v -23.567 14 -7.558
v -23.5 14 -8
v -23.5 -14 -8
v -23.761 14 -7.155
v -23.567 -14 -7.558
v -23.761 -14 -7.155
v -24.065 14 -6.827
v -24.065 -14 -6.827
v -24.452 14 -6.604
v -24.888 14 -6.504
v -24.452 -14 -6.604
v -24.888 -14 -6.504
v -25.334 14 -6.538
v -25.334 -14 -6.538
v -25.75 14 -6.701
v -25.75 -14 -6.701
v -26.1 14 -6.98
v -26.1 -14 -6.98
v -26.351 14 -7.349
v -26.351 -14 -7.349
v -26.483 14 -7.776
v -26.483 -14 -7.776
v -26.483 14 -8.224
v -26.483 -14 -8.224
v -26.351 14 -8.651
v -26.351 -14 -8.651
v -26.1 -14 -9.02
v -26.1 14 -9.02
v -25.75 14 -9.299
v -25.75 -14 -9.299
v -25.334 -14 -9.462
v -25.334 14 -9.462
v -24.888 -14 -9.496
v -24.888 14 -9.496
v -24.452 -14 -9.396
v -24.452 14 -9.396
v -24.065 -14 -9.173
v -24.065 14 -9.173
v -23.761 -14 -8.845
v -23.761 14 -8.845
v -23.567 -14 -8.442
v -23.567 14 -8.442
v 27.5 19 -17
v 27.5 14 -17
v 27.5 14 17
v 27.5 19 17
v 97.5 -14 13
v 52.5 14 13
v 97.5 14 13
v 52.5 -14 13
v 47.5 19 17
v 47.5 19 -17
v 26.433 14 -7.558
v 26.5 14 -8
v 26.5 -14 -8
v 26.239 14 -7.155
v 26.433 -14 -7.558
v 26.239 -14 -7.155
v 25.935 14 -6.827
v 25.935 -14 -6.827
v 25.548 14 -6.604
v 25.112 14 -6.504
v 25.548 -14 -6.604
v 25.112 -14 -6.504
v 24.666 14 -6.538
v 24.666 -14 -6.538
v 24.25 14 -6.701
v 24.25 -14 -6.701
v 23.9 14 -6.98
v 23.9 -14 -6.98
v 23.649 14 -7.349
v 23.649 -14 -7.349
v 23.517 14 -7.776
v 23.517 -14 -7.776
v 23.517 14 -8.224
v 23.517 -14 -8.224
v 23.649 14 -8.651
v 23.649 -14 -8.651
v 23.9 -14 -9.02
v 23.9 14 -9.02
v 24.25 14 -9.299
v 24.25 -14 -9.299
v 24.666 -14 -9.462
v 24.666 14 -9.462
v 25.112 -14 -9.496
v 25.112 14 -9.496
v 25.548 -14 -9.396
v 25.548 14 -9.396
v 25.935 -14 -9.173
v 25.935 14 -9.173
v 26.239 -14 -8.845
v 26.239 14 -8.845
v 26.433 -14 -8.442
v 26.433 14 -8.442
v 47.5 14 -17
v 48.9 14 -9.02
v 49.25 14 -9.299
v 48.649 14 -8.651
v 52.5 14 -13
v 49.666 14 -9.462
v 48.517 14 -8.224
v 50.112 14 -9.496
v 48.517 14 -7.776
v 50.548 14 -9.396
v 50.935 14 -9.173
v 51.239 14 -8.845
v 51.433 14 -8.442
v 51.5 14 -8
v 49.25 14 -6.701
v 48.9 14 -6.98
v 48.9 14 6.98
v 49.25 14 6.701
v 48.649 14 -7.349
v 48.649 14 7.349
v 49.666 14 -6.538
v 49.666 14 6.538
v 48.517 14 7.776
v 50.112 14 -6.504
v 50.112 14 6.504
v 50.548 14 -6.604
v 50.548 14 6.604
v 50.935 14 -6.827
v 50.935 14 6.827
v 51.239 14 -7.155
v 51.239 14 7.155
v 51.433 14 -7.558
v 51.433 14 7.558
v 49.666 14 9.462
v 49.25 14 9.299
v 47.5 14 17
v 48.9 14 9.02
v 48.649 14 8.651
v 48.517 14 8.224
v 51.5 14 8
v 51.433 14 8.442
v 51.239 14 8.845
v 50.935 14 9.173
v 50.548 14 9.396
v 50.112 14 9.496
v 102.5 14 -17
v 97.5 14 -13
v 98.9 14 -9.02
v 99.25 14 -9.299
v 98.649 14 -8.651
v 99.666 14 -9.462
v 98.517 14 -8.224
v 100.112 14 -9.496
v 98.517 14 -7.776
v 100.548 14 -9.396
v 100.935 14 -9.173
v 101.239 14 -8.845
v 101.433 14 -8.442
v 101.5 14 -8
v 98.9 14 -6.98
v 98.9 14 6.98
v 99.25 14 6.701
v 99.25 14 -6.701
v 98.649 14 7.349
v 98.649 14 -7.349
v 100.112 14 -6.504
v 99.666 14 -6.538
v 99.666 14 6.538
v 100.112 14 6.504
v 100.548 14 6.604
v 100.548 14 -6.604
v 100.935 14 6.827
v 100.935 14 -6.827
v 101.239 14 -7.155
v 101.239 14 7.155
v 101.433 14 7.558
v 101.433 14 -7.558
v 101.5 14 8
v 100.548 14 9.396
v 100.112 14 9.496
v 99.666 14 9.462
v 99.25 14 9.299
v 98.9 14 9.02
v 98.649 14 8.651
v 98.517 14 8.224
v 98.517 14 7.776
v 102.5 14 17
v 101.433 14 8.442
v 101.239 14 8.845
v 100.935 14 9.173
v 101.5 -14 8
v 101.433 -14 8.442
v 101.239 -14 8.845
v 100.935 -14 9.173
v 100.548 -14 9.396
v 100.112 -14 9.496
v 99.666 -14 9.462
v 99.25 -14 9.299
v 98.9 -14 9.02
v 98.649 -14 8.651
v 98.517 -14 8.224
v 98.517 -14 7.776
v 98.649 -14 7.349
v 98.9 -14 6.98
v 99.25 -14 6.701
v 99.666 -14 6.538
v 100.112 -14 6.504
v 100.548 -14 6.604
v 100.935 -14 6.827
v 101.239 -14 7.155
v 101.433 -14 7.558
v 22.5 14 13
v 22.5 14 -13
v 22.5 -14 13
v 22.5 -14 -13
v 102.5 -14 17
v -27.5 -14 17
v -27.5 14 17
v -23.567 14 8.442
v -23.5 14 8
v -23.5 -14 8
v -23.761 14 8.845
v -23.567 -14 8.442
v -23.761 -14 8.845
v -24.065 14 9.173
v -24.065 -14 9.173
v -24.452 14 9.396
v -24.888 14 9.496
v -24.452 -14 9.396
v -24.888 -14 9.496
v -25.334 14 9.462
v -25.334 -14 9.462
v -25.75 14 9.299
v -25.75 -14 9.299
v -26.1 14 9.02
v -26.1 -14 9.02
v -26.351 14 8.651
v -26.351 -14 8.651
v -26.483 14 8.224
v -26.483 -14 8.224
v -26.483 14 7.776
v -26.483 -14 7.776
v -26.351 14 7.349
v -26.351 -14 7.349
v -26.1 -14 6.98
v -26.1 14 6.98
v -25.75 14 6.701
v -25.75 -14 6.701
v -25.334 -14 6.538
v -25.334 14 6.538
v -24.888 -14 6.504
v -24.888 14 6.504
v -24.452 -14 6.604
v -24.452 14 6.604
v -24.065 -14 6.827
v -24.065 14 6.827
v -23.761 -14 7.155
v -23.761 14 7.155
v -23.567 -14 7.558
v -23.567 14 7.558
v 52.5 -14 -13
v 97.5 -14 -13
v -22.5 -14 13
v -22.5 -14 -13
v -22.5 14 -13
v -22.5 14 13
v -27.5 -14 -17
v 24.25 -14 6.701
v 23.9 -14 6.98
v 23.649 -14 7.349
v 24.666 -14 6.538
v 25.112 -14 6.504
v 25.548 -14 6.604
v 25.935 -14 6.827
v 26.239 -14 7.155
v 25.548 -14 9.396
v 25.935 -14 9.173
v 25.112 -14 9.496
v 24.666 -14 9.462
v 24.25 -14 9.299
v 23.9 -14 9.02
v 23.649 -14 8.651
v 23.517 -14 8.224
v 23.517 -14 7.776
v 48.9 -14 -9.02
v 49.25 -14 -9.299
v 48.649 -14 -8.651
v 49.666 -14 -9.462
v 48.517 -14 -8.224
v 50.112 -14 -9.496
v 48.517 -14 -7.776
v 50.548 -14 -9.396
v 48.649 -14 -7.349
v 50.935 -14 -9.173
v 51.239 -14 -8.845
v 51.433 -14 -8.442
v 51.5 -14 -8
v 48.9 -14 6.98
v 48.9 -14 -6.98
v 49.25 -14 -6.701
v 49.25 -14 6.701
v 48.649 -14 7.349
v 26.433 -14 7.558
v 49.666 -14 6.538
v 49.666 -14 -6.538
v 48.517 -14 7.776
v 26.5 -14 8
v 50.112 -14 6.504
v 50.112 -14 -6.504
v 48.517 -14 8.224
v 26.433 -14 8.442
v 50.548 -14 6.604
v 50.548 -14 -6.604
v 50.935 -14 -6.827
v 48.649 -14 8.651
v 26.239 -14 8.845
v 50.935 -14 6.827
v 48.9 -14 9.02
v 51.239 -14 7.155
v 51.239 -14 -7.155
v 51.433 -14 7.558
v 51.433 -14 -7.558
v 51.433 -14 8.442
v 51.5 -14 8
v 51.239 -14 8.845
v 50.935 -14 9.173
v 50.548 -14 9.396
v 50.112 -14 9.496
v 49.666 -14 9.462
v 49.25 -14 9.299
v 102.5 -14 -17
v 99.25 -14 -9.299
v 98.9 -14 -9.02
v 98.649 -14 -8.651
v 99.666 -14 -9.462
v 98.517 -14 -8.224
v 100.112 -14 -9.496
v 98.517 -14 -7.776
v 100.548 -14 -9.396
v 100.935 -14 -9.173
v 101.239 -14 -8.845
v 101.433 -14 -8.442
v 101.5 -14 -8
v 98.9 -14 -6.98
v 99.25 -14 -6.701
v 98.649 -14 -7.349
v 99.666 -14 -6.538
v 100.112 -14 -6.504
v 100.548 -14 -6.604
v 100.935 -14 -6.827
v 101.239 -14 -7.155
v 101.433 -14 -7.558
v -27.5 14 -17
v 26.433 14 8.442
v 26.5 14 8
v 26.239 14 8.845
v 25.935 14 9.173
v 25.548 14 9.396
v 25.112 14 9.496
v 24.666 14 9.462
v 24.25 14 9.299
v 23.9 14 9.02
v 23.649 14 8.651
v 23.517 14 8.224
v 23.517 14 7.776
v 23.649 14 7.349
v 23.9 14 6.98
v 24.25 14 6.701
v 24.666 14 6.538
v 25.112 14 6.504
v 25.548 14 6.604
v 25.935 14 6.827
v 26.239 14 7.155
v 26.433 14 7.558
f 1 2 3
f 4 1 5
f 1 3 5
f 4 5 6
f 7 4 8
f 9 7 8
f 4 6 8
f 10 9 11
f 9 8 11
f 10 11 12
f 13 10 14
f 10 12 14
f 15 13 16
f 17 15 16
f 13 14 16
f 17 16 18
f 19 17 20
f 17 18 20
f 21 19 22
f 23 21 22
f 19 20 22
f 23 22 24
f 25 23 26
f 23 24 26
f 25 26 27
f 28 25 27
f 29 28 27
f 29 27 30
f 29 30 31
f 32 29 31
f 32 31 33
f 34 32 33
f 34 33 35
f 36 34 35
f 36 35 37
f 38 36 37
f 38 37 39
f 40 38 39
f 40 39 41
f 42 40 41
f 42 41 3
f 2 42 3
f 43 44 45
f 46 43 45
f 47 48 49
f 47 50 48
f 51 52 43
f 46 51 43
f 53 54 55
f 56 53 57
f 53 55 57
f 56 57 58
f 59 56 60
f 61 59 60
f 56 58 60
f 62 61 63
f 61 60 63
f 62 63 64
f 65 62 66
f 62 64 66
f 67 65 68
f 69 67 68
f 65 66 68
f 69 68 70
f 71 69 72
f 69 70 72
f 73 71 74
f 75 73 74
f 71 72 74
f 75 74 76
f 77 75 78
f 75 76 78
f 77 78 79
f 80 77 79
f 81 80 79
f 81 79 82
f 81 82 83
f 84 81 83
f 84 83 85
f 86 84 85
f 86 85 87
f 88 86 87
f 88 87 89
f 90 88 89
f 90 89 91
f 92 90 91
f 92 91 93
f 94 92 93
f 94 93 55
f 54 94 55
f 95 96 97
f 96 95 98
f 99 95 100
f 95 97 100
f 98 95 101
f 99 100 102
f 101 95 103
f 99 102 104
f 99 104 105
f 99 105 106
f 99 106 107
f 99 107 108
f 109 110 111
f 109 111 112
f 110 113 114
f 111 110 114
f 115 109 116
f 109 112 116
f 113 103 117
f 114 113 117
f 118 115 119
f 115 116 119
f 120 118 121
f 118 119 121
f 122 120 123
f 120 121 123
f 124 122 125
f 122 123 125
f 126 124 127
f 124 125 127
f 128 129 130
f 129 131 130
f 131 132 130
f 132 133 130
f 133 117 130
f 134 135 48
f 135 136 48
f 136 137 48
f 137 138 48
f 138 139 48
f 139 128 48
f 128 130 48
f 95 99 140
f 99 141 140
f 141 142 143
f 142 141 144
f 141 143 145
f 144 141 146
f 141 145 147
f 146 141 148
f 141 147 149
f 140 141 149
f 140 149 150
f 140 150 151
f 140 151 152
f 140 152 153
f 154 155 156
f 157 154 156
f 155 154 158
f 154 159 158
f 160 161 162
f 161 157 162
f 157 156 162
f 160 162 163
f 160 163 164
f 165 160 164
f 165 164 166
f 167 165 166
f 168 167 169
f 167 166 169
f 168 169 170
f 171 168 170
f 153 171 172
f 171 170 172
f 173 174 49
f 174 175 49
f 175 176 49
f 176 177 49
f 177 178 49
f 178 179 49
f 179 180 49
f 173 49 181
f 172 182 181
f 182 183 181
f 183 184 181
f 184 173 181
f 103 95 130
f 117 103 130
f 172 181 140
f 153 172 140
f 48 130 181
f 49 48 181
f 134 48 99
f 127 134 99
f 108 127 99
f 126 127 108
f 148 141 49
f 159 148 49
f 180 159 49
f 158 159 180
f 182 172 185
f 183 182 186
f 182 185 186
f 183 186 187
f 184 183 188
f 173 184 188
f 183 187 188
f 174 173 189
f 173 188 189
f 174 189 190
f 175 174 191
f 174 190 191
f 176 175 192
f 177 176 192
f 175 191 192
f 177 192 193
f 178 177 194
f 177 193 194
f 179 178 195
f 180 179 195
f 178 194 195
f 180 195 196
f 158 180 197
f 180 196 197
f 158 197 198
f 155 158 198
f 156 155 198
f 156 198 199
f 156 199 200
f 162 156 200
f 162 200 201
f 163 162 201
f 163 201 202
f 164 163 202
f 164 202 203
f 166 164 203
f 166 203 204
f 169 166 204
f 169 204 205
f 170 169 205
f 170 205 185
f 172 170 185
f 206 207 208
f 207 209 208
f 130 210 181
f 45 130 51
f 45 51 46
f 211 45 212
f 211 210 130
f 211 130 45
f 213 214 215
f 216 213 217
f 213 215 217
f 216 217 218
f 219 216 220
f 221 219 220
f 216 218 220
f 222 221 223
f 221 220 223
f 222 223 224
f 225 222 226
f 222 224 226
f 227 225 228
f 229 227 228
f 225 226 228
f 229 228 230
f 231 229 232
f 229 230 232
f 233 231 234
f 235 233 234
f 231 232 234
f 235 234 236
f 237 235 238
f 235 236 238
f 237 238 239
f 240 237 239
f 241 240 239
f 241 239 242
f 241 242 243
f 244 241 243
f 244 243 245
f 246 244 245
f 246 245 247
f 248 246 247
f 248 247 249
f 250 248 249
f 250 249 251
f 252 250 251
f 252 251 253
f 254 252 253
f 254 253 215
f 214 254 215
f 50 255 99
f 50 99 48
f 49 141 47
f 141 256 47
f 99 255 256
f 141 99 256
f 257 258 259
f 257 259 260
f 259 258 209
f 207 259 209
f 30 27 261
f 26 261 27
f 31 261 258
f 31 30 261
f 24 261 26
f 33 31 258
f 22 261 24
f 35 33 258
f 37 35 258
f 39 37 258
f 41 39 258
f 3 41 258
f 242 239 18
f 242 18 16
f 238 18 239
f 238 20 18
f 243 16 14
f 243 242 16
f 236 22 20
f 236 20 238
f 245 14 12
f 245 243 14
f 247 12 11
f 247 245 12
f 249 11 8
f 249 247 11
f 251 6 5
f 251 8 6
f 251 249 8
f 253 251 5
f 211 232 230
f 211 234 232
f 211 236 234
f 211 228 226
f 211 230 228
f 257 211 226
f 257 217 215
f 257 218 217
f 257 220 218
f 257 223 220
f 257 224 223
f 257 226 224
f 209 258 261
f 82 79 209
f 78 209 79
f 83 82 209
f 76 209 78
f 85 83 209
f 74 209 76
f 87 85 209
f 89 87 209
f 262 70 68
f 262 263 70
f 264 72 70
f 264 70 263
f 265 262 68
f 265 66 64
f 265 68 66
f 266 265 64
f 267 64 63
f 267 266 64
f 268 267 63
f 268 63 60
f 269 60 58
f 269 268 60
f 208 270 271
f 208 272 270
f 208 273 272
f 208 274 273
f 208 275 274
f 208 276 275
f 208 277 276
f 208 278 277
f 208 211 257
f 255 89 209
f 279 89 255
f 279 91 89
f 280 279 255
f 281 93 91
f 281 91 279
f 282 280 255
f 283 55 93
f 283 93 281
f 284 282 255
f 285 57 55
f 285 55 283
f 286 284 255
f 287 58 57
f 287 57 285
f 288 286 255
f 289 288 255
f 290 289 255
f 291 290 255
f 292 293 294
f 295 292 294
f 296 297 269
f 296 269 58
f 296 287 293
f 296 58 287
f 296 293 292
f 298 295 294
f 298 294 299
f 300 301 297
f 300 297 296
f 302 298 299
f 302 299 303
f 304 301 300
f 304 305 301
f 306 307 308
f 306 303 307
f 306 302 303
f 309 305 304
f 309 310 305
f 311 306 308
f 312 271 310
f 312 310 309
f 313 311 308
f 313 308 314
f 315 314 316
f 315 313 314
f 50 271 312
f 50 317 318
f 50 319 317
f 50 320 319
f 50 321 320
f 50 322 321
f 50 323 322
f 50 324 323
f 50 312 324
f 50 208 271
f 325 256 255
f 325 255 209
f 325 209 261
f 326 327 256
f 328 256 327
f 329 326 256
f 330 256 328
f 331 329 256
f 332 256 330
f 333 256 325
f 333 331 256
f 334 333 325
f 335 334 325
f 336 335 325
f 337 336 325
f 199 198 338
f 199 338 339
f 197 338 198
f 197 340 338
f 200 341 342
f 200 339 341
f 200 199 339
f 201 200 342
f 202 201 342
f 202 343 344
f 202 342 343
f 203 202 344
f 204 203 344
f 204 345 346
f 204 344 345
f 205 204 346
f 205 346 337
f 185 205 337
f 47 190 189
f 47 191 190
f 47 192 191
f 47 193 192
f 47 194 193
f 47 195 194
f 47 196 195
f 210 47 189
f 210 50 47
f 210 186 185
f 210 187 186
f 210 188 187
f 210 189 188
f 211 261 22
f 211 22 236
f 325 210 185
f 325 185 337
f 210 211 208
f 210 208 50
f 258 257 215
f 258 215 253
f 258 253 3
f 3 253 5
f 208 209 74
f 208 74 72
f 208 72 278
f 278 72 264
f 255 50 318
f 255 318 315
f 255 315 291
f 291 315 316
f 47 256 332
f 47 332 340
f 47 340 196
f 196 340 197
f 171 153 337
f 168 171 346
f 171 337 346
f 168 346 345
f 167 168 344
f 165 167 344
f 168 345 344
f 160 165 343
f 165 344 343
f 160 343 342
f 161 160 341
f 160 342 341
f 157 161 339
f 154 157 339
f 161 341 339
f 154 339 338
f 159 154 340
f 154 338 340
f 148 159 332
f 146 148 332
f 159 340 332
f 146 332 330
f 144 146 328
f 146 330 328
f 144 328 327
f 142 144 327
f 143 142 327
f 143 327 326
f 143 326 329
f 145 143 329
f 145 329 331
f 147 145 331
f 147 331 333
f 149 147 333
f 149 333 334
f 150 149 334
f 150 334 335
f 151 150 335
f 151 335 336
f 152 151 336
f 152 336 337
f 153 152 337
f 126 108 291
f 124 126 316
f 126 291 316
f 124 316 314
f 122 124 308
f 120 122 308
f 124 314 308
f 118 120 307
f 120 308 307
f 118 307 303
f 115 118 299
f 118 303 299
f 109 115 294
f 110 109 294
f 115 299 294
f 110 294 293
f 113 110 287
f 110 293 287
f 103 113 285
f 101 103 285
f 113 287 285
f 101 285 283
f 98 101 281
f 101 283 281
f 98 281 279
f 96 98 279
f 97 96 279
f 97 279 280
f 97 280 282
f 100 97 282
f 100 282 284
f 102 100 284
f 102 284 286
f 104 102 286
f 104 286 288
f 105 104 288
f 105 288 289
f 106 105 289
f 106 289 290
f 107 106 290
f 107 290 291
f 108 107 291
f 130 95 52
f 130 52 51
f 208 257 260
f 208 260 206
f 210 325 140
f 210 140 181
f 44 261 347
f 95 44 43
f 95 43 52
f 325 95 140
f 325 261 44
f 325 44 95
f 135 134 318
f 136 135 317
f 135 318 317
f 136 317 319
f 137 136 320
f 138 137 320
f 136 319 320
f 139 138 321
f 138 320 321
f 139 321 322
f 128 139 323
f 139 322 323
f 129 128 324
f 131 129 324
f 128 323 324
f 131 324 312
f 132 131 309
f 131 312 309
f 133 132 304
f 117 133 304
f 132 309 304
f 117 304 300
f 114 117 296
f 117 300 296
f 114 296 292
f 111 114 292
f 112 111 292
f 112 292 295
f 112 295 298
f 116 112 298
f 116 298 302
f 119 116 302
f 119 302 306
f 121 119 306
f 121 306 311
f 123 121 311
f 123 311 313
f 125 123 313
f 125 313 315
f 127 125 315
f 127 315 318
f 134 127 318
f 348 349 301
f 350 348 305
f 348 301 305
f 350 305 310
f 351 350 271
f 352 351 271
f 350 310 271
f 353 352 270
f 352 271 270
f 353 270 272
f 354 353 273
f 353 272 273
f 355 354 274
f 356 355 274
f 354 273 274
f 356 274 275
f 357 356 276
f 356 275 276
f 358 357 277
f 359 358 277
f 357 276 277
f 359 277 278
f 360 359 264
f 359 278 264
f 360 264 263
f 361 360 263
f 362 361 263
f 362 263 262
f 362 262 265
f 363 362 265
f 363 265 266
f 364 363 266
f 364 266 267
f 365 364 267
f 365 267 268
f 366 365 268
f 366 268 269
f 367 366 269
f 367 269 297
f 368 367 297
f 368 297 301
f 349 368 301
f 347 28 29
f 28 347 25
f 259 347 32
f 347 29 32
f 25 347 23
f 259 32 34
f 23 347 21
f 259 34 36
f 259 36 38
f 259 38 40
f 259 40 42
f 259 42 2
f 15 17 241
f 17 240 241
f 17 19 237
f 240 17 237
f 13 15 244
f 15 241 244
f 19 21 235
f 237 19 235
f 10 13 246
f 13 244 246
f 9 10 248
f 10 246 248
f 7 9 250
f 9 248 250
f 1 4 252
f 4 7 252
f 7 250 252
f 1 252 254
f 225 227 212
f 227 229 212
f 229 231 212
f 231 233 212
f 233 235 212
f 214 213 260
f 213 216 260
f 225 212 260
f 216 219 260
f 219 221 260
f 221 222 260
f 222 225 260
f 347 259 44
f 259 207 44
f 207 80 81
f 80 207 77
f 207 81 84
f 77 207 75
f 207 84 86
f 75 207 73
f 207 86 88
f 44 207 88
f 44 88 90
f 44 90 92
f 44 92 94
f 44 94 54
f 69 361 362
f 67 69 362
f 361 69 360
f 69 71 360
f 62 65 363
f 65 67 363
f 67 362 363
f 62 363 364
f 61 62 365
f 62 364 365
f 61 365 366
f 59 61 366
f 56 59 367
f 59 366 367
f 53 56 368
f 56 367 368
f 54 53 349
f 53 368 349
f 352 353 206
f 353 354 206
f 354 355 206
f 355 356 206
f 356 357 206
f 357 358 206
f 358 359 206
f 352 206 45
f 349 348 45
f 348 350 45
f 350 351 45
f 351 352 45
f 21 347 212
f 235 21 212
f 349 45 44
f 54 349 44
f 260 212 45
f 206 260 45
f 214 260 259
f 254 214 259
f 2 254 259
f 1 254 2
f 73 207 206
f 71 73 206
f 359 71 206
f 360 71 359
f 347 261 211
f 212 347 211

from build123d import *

# Parameters (mm, degrees)
F0_W     = 55
F0_H     = 34
F0_W_2   = 45
F0_H_2   = 26
F0_W_3   = 20
F1_DEPTH = 14
F2_R     = 1.5
F3_DEPTH = 30
F4_W     = 20
F4_H     = 34
F5_DEPTH = 5


with BuildPart() as f1:
    # F0 (on Front) → F1 (new body, symmetric)
    with BuildSketch(Plane.XZ):
        Rectangle(F0_W, F0_H)
        Rectangle(F0_W_2, F0_H_2, mode=Mode.SUBTRACT)
        with Locations((37.5, 0)):
            Rectangle(F0_W_3, F0_H)
        with Locations((75, 0)):
            Rectangle(F0_W, F0_H)
        with Locations((75, 0)):
            Rectangle(F0_W_2, F0_H_2, mode=Mode.SUBTRACT)
    extrude(amount=F1_DEPTH, both=True)

    # F2 (on face) → F3 (cut)
    with BuildSketch(Plane.XZ.offset(14)):
        with Locations((25, 8)):
            Circle(F2_R)
        with Locations((-25, 8)):
            Circle(F2_R)
        with Locations((-25, -8)):
            Circle(F2_R)
        with Locations((25, -8)):
            Circle(F2_R)
        with Locations((50, 8)):
            Circle(F2_R)
        with Locations((50, -8)):
            Circle(F2_R)
        with Locations((100, 8)):
            Circle(F2_R)
        with Locations((100, -8)):
            Circle(F2_R)
    extrude(amount=-F3_DEPTH, mode=Mode.SUBTRACT)

    # F4 (on face) → F5 (join)
    with BuildSketch(Plane(origin=(0, 14, 0), x_dir=(-1, 0, 0), z_dir=(0, 1, 0))):
        with Locations((-37.5, 0)):
            Rectangle(F4_W, F4_H)
    extrude(amount=F5_DEPTH)


solid = f1.part
